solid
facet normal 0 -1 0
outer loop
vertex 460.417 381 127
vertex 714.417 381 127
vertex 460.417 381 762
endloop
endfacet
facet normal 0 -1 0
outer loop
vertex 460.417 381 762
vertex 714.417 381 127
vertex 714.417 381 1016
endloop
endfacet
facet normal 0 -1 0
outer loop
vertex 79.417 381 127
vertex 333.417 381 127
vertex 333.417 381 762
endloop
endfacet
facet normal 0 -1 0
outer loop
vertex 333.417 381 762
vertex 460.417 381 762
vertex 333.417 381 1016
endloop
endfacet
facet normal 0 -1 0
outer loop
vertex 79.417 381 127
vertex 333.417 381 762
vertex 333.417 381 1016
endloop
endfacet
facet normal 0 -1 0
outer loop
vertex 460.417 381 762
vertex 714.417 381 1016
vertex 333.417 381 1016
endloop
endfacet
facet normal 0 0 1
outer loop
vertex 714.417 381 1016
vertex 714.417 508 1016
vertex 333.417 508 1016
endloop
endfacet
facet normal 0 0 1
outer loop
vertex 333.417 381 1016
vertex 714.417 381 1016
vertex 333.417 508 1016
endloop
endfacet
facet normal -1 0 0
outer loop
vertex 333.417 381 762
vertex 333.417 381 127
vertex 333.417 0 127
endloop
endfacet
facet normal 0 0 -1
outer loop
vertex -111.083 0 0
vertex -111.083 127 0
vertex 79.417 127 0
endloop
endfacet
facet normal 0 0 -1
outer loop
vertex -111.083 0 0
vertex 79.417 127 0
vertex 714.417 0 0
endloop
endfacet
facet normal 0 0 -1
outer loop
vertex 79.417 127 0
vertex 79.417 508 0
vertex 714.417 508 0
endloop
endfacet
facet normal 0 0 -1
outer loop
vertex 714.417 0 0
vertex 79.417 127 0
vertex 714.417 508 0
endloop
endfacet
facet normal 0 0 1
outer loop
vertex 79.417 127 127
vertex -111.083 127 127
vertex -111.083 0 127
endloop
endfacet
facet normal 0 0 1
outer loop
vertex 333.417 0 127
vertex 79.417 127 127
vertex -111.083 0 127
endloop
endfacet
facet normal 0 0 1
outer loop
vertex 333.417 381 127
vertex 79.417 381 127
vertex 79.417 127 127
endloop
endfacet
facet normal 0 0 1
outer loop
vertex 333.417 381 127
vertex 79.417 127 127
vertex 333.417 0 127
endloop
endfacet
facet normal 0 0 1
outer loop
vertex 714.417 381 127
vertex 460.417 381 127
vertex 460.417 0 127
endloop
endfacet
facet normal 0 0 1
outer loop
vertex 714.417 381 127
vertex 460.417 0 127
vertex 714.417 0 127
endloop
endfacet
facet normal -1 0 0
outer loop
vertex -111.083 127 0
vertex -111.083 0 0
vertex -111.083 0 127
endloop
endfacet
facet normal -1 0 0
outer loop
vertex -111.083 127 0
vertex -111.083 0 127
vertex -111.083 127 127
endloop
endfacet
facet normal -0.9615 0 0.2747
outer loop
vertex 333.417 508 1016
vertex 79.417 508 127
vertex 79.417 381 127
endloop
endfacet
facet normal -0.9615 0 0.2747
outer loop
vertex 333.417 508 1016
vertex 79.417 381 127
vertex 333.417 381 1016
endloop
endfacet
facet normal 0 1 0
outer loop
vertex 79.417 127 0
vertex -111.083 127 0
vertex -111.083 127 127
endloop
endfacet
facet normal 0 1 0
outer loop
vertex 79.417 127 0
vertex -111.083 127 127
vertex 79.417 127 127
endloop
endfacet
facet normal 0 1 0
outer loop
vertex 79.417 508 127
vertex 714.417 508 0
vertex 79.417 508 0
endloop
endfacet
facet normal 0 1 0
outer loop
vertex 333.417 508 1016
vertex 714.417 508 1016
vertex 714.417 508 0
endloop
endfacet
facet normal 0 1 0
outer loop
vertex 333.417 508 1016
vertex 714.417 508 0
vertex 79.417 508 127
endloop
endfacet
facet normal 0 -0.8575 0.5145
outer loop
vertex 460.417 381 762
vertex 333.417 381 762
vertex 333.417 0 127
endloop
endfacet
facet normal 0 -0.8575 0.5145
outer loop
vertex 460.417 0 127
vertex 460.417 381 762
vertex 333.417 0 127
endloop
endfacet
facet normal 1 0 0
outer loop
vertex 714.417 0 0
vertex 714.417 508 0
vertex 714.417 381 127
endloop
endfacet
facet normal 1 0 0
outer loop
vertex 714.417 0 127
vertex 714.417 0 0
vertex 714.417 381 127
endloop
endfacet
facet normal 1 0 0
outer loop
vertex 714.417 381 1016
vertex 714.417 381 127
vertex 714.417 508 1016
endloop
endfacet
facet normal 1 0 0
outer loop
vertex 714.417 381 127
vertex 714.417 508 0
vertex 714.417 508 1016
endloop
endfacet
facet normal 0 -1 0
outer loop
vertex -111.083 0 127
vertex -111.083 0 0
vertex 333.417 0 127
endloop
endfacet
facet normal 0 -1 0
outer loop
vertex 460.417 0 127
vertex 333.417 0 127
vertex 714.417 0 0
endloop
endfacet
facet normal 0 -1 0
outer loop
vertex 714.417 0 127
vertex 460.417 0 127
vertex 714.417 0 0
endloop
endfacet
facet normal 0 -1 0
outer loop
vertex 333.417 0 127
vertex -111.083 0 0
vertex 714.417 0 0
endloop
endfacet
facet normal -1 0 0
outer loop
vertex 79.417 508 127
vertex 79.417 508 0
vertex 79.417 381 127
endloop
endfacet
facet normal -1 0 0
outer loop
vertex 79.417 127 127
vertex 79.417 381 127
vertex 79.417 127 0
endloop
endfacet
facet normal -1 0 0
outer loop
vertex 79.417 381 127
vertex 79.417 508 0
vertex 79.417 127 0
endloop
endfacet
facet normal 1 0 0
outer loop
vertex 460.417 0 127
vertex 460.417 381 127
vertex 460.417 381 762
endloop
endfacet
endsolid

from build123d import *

# Parameters (mm, degrees)
F0_W     = 190.5
F0_H     = 127
F1_DEPTH = 127
F2_W     = 381
F2_H     = 889
F3_DEPTH = 127
F4_W     = 127
F4_H     = 635
F5_DEPTH = 381
F7_DEPTH = 381.001


with BuildPart() as f1:
    # F0 (on Top) → F1 (new body)
    with BuildSketch(Plane.XY):
        Polygon((79.417029, 127), (79.417029, 0), (714.417029, 0), (714.417029, 508), (79.417029, 508), align=None)
        with Locations((-15.832971, 63.5)):
            Rectangle(F0_W, F0_H)
    extrude(amount=F1_DEPTH)

    # F2 (on face) → F3 (join)
    with BuildSketch(Plane(origin=(0, 508, 0), x_dir=(-1, 0, 0), z_dir=(0, 1, 0))):
        with Locations((-523.917029, 571.5)):
            Rectangle(F2_W, F2_H)
        Polygon((-333.417029, 1016), (-333.417029, 127), (-79.417029, 127), align=None)
    extrude(amount=-F3_DEPTH)

    # F4 (on face) → F5 (join, through all)
    with BuildSketch(Plane.XZ.offset(-381)):
        with Locations((396.917029, 444.5)):
            Rectangle(F4_W, F4_H)
    extrude(amount=F5_DEPTH)

    # F6 (on face) → F7 (cut, through all)
    with BuildSketch(Plane(origin=(333.417029, 0, 0), x_dir=(0, -1, 0), z_dir=(-1, 0, 0))):
        Polygon((0, 762), (-381, 762), (0, 127), align=None)
    extrude(amount=-F7_DEPTH, mode=Mode.SUBTRACT)


solid = f1.part
